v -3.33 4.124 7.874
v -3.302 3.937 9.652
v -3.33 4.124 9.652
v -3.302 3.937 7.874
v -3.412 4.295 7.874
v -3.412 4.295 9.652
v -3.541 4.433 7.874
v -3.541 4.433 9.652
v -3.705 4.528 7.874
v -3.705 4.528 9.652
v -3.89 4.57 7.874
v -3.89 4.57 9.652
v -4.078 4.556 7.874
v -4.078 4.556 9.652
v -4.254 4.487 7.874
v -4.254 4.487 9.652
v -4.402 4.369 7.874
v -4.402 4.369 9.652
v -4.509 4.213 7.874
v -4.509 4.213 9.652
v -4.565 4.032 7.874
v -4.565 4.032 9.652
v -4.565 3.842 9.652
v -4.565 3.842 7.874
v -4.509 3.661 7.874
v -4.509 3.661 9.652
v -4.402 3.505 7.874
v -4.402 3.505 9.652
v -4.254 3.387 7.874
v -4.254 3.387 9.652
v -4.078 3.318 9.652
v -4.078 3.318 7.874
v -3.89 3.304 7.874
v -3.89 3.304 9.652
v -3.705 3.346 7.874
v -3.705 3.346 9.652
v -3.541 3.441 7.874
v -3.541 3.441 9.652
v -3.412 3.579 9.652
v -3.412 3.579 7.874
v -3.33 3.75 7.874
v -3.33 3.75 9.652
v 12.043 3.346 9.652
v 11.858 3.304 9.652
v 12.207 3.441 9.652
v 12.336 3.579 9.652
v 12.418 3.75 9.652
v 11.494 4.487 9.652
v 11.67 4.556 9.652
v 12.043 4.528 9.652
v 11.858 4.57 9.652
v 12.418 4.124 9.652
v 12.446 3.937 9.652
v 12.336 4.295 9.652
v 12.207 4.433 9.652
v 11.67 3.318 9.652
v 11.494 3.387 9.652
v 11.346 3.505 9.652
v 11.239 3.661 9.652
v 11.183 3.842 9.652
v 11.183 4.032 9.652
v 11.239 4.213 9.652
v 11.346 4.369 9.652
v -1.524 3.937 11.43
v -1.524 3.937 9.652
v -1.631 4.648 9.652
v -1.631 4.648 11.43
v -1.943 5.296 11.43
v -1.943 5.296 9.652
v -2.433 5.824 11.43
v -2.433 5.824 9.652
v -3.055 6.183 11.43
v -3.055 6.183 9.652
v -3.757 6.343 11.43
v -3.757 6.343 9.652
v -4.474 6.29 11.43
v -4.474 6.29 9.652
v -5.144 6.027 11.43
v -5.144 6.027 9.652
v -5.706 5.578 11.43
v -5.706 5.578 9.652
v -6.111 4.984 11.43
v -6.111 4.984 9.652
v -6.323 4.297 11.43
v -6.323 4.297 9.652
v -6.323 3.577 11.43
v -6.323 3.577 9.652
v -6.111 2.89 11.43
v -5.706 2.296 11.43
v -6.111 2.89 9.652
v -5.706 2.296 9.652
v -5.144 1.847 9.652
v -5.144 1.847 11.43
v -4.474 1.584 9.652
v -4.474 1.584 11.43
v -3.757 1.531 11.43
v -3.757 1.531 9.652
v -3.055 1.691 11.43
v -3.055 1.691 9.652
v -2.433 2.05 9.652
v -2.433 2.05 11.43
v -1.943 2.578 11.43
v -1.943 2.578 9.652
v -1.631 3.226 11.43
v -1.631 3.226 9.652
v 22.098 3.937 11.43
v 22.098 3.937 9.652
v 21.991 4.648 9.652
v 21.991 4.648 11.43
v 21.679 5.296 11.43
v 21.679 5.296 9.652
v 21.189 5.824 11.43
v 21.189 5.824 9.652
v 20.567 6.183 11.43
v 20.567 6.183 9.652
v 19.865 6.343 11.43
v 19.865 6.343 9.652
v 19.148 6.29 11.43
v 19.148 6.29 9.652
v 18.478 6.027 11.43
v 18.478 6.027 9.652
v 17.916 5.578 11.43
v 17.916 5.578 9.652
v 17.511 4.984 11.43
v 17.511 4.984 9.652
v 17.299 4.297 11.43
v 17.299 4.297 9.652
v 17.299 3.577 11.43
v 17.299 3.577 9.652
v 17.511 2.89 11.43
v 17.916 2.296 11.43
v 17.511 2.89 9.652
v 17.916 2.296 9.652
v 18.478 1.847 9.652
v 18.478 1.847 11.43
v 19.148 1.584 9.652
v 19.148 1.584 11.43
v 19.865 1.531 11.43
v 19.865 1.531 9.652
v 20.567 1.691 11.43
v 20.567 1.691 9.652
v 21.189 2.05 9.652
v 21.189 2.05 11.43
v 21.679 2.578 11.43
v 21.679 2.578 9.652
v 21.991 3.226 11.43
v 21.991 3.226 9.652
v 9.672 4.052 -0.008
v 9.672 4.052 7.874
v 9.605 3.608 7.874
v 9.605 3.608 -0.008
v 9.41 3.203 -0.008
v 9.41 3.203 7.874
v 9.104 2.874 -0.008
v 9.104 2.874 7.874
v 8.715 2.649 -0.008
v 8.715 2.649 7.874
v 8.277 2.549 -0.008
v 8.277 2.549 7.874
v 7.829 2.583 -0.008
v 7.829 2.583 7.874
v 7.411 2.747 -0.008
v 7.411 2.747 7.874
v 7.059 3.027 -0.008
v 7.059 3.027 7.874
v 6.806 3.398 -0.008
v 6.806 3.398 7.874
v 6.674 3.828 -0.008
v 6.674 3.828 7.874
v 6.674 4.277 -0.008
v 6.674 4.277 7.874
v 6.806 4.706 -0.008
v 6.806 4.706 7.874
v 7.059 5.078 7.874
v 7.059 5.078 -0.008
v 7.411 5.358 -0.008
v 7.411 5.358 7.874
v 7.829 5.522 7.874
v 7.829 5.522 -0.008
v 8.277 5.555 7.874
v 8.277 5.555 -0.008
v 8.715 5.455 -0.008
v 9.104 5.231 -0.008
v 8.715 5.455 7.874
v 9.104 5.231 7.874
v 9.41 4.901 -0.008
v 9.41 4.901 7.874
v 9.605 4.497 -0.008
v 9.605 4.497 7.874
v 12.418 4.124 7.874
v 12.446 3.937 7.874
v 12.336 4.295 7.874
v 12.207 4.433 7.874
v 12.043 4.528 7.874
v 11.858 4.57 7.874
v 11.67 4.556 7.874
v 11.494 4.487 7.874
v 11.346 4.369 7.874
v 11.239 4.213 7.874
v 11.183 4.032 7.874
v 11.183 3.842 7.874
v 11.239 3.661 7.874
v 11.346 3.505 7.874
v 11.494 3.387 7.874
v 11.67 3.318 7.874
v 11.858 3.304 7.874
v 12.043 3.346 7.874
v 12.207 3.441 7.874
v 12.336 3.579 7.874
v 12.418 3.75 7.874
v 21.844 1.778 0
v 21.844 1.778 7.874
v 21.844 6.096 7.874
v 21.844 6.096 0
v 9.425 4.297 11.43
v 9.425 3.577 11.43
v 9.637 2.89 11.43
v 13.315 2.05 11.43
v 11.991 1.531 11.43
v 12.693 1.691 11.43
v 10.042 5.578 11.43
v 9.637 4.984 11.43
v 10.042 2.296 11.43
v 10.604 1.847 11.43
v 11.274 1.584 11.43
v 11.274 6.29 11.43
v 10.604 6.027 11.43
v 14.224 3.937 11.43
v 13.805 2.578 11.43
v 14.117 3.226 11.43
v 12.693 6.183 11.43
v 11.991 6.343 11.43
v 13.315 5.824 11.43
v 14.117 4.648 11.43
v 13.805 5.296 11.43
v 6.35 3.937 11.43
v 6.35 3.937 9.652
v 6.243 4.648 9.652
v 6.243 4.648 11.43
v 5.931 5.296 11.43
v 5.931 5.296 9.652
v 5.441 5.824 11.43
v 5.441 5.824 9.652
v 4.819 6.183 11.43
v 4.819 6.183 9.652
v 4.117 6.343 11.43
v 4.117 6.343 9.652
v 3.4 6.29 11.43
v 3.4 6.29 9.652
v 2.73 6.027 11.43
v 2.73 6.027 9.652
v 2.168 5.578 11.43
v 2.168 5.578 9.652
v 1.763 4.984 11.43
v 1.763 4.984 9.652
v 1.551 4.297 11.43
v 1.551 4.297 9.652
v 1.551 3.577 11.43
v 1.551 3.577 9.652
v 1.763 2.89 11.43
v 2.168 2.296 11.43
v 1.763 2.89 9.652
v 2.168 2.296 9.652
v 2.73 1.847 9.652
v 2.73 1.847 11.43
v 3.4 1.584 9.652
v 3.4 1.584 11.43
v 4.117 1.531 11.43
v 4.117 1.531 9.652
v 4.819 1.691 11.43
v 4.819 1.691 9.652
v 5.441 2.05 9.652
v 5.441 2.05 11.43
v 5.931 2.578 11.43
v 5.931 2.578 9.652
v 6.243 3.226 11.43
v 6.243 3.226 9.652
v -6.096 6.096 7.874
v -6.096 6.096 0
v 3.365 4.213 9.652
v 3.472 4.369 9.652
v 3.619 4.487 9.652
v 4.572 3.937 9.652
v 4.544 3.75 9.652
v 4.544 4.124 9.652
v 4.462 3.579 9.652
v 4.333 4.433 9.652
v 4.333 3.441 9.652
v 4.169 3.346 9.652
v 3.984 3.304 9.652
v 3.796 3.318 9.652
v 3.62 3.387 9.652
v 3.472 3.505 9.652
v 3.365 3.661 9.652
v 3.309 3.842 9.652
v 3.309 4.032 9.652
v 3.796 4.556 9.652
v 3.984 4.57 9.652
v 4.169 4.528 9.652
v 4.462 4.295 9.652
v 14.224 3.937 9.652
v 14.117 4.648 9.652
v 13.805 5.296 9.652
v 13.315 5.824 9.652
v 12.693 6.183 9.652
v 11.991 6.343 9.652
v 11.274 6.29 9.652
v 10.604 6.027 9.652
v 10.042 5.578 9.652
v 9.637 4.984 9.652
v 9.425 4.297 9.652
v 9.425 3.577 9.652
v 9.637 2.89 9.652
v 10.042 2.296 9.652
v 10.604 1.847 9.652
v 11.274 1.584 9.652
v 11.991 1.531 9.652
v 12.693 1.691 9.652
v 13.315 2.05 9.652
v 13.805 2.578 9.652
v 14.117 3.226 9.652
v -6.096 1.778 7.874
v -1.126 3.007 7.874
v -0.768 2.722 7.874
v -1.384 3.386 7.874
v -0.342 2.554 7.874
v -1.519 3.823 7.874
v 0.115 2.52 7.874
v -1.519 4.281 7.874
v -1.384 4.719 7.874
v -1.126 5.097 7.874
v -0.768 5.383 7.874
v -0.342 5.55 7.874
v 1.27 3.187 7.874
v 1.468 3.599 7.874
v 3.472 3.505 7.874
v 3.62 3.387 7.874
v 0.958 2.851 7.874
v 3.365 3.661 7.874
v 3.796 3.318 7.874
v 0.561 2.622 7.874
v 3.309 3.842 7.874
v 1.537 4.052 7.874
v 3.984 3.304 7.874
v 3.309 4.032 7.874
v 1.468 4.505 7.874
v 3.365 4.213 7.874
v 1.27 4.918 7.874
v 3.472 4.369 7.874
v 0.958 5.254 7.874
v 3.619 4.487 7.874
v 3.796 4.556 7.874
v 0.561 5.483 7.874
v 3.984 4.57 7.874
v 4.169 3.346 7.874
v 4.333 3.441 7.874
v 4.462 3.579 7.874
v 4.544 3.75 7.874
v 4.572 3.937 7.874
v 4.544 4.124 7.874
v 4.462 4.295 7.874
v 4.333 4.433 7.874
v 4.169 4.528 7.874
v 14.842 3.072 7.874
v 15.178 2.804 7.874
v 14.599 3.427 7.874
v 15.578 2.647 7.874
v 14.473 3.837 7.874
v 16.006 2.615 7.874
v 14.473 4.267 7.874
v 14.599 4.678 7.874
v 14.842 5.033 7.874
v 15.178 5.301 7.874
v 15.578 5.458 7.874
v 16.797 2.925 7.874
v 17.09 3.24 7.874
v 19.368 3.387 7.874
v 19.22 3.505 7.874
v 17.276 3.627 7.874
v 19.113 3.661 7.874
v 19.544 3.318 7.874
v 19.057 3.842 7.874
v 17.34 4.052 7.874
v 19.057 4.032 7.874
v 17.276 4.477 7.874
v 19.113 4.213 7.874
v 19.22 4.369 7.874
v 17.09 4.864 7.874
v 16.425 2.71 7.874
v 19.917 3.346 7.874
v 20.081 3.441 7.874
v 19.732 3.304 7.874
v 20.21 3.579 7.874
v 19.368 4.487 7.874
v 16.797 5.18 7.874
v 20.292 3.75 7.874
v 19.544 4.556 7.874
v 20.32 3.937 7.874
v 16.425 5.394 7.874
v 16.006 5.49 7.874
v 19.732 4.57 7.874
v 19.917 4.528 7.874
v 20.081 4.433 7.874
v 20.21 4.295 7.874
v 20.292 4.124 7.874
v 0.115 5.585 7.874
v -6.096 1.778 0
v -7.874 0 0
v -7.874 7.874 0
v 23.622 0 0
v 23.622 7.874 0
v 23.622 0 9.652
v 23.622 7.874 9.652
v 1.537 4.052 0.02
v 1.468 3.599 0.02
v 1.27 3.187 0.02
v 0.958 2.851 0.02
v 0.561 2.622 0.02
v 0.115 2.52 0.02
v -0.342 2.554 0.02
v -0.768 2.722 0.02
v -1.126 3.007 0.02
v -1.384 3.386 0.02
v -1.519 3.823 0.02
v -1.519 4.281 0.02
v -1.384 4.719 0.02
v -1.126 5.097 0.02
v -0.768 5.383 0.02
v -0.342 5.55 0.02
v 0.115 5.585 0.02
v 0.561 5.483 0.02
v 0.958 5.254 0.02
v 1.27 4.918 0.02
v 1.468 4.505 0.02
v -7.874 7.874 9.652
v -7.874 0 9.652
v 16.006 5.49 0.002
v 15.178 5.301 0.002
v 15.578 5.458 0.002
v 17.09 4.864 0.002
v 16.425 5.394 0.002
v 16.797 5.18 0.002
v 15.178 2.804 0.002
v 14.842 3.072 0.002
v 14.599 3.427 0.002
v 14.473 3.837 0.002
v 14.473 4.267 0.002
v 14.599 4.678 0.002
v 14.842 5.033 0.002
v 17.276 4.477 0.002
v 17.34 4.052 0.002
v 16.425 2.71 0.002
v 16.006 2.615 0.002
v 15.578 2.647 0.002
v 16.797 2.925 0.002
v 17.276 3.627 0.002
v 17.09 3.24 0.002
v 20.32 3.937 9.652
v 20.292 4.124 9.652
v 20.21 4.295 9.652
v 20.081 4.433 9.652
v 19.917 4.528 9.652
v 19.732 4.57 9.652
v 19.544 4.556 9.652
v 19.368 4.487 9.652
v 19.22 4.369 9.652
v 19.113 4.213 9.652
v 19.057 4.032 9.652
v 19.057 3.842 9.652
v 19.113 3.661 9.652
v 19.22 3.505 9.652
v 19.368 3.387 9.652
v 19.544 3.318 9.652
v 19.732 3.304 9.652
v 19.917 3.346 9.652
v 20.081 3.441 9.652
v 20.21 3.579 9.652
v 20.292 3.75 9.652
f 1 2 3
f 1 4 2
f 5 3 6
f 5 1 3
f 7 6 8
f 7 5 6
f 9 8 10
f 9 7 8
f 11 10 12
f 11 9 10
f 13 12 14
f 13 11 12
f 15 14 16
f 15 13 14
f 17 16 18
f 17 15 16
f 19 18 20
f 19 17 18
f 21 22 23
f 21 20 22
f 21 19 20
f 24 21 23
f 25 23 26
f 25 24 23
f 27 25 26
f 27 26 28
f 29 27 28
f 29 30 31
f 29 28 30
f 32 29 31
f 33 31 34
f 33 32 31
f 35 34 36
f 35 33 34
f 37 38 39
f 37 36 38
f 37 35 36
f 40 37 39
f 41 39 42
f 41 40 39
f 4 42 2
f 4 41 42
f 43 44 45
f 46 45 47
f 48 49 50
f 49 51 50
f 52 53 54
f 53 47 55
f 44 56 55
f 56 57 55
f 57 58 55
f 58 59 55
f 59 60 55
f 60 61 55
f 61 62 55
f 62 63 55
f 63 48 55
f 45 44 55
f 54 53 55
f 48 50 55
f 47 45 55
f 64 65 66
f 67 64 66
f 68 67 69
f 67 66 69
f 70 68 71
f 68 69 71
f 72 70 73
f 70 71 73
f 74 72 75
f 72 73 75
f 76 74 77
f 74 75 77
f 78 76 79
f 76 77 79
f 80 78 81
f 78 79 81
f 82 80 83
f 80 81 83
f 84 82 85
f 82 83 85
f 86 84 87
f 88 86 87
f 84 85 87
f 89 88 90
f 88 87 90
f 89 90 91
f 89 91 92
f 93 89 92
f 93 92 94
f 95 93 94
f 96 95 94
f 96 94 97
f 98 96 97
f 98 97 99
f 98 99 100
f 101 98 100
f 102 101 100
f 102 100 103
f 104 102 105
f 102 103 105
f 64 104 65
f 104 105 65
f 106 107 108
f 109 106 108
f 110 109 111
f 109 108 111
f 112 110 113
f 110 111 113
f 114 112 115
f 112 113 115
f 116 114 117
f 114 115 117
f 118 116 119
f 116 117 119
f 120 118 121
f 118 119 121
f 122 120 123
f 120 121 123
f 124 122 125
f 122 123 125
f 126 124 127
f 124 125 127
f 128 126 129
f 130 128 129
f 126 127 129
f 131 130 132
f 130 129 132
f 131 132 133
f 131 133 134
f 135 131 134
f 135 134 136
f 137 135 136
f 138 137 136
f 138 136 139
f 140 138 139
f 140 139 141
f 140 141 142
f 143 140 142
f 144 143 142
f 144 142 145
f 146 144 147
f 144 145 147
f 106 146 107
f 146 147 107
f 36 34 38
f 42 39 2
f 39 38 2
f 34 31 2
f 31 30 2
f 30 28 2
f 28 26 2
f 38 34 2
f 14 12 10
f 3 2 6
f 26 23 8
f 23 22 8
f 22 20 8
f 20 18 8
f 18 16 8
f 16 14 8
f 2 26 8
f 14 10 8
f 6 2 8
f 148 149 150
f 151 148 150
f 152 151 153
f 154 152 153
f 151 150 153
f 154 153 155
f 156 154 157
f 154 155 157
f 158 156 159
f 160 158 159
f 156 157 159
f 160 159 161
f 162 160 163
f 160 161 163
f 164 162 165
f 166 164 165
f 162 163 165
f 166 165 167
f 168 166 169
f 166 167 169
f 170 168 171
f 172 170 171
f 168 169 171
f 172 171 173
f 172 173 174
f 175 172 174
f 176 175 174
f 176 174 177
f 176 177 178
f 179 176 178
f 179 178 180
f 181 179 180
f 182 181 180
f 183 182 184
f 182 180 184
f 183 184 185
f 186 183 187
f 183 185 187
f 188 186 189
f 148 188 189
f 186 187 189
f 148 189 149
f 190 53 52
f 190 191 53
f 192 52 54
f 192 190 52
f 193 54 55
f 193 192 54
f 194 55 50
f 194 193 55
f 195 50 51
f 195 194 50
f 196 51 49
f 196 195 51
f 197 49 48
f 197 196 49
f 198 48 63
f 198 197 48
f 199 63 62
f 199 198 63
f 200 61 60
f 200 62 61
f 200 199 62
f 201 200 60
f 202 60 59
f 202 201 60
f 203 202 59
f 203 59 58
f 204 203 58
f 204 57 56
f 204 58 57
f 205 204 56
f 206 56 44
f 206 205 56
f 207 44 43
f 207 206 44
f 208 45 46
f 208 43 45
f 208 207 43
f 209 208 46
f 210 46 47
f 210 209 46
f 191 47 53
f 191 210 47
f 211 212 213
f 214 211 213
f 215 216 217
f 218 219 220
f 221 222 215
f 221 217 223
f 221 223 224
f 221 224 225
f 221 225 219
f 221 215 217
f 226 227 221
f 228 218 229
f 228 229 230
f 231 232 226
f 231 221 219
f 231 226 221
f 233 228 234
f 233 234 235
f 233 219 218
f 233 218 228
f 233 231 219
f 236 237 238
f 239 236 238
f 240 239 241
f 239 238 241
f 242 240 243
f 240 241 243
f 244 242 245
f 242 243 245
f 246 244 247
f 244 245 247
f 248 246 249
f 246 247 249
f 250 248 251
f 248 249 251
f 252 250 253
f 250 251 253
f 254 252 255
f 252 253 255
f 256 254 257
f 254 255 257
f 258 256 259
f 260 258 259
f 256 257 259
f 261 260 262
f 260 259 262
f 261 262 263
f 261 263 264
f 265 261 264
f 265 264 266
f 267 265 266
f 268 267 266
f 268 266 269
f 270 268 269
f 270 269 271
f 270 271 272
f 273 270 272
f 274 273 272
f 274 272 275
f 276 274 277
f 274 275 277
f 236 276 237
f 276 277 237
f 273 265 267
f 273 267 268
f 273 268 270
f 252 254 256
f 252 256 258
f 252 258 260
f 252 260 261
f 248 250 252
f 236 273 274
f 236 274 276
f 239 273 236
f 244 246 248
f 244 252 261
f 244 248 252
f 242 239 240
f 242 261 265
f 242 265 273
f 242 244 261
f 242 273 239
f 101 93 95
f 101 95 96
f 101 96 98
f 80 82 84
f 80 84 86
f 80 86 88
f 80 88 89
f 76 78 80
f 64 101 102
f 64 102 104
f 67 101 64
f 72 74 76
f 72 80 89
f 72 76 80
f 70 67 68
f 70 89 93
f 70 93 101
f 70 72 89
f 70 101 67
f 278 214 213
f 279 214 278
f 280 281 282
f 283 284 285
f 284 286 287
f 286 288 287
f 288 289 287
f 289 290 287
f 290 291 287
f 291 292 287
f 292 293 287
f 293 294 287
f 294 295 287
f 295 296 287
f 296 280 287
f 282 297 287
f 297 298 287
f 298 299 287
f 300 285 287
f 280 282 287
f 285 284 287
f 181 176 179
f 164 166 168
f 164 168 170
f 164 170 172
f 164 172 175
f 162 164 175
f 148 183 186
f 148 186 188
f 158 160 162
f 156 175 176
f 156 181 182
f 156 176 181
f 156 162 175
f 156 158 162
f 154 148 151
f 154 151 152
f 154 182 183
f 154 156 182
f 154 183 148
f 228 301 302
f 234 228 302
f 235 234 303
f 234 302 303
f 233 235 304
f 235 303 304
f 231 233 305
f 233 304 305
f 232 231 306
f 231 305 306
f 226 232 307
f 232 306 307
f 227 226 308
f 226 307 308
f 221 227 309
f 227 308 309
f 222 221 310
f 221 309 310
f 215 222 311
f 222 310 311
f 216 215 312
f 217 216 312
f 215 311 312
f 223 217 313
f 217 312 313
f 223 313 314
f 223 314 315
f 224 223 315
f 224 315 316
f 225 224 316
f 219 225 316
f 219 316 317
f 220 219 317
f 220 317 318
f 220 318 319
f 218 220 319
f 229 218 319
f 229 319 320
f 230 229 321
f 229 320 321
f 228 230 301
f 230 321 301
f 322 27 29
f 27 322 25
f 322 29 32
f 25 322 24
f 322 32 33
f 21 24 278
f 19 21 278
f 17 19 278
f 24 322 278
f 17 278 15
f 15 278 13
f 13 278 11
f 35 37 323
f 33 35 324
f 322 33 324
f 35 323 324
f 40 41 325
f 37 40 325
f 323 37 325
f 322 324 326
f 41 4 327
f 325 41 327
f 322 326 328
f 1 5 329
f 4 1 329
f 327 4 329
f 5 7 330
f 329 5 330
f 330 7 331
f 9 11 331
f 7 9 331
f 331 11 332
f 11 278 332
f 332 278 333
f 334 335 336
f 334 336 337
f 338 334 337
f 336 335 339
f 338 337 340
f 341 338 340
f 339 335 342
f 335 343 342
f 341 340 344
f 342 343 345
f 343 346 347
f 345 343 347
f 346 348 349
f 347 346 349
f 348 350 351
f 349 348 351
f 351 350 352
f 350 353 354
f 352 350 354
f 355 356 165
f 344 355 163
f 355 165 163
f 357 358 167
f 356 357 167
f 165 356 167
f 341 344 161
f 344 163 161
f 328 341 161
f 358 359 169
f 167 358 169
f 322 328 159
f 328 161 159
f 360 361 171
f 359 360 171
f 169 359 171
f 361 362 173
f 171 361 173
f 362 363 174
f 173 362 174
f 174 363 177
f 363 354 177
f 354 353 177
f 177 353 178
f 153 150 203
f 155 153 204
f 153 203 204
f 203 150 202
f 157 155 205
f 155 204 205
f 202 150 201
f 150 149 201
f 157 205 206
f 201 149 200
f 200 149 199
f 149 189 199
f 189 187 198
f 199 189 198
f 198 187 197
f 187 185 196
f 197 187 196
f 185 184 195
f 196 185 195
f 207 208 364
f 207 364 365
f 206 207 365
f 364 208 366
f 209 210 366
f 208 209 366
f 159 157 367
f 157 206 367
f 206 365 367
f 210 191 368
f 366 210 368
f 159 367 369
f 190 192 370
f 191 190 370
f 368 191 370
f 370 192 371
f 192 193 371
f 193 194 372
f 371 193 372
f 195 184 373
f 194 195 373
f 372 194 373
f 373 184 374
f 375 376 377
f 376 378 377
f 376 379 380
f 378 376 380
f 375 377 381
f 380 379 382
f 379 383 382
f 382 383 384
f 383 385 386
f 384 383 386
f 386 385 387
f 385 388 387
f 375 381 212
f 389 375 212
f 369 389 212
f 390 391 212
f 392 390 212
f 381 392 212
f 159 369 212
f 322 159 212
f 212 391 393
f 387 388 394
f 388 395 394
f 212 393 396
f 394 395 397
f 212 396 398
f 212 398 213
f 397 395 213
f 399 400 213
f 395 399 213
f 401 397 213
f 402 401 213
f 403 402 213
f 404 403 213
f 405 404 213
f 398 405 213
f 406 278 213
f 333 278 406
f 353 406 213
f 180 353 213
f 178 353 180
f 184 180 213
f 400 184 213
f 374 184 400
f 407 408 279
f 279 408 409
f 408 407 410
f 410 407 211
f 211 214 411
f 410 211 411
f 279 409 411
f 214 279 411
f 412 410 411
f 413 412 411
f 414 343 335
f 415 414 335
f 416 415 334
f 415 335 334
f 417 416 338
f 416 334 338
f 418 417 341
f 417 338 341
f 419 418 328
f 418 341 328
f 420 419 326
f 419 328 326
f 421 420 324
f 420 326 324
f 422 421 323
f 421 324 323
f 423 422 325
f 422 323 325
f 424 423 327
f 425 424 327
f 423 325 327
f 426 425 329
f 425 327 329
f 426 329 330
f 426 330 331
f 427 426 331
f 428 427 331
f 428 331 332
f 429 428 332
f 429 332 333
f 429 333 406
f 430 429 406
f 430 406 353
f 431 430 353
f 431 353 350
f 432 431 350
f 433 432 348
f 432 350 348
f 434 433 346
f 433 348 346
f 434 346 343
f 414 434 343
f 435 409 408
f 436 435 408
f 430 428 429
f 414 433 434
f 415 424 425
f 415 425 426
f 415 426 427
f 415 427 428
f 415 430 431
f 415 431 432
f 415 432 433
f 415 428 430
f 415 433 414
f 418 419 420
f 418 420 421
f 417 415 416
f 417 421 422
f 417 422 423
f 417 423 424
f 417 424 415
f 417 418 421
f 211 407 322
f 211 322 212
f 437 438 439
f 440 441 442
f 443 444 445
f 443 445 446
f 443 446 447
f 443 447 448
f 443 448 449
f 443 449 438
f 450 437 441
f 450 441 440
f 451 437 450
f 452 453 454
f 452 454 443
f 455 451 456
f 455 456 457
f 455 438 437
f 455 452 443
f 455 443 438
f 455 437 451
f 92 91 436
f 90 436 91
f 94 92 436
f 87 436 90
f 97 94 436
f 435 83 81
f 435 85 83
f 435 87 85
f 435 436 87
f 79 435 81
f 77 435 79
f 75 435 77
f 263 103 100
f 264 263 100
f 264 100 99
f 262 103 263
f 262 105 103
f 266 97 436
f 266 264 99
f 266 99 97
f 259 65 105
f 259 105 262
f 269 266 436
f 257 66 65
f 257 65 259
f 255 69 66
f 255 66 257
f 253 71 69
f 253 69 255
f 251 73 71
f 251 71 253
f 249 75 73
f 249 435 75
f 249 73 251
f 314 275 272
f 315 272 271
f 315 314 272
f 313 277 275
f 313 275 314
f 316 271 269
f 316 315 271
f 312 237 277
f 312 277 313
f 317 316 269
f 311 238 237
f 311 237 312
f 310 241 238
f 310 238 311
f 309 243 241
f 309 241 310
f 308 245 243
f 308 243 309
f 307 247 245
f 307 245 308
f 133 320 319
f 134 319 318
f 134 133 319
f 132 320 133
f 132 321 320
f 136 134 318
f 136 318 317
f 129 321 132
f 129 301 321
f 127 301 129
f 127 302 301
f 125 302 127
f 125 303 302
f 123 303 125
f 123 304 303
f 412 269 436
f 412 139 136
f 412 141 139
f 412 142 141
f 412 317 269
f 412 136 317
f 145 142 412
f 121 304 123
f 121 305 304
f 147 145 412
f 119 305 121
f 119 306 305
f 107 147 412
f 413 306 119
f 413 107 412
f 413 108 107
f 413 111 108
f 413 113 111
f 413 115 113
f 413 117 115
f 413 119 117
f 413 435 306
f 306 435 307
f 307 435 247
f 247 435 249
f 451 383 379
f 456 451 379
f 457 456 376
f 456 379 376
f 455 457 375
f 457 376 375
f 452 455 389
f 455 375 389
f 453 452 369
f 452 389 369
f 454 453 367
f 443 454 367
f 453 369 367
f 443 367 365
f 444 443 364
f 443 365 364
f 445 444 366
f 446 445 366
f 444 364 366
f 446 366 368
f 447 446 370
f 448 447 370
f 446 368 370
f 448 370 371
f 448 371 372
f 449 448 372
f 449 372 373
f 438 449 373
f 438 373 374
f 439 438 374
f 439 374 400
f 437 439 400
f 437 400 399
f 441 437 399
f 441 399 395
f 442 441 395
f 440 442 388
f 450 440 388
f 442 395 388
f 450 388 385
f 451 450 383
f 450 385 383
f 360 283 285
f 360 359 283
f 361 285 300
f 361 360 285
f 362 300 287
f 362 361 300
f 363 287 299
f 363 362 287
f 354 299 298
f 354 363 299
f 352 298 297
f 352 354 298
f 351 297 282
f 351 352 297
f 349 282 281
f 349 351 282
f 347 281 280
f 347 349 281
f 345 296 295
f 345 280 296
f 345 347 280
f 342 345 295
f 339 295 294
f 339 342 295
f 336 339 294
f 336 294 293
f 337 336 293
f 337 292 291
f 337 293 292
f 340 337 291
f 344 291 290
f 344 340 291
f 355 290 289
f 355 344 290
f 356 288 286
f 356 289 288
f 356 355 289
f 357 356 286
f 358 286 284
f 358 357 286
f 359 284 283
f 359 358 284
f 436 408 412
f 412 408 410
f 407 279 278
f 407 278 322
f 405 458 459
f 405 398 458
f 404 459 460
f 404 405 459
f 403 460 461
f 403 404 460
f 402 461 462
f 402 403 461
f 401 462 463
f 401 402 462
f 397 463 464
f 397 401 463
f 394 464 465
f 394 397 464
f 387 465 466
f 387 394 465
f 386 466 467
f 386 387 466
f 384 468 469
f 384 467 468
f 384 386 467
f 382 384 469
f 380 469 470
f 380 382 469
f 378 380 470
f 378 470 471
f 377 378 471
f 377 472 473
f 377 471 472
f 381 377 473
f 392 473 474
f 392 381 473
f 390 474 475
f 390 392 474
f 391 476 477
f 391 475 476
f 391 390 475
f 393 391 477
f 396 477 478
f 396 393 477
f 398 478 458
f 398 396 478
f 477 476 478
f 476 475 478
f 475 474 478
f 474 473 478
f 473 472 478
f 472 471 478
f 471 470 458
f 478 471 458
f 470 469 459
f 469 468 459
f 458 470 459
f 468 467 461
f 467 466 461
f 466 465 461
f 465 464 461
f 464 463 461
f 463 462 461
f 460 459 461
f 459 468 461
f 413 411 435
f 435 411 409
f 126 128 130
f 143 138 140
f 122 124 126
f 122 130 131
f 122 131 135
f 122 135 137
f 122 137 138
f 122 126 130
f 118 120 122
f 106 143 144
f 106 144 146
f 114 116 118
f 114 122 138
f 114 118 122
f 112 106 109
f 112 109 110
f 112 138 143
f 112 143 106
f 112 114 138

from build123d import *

# Parameters (mm, degrees)
F1_DEPTH  = 9.652
F2_R      = 2.413
F3_DEPTH  = 1.778
F4_DEPTH  = 1.778
F5_DEPTH  = 1.778
F6_DEPTH  = 1.778
F7_T      = -1.778
F8_R      = 1.4417359586
F9_DEPTH  = 7.87157
F8_R_2    = 1.507368722
F10_DEPTH = 7.88241
F8_R_3    = 1.5366007798
F11_DEPTH = 7.85389


with BuildPart() as f1:
    # F0 (on Top) → F1 (new body)
    with BuildSketch(Plane.XY):
        Polygon((-7.874, 0), (0, 0), (23.622, 0), (23.622, 7.874), (-7.874, 7.874), align=None)
    extrude(amount=F1_DEPTH)

    # F2 (on face) → F3 (join)
    with BuildSketch(Plane.XY.offset(9.652)):
        with Locations((19.685, 3.937)):
            Circle(F2_R)
    extrude(amount=F3_DEPTH)

    # F2 (on face) → F4 (join)
    with BuildSketch(Plane.XY.offset(9.652)):
        with Locations((11.811, 3.937)):
            Circle(F2_R)
    extrude(amount=F4_DEPTH)

    # F2 (on face) → F5 (join)
    with BuildSketch(Plane.XY.offset(9.652)):
        with Locations((3.937, 3.937)):
            Circle(F2_R)
    extrude(amount=F5_DEPTH)

    # F2 (on face) → F6 (join)
    with BuildSketch(Plane.XY.offset(9.652)):
        with Locations((-3.937, 3.937)):
            Circle(F2_R)
    extrude(amount=F6_DEPTH)

    # F7
    f7_openings = [f1.faces().sort_by_distance(p)[0] for p in [
        (7.874, 3.937, 0),
    ]]
    offset(amount=F7_T, openings=f7_openings, kind=Kind.INTERSECTION)

    # F8 (on face) → F9 (join)
    with BuildSketch(Plane(origin=(0, 0, 7.874), x_dir=(1, 0, 0), z_dir=(0, 0, -1))):
        with Locations((15.8983748406, -4.0523083881)):
            Circle(F8_R)
    extrude(amount=F9_DEPTH)

    # F8 (on face) → F10 (join)
    with BuildSketch(Plane(origin=(0, 0, 7.874), x_dir=(1, 0, 0), z_dir=(0, 0, -1))):
        with Locations((8.1644477323, -4.0523083881)):
            Circle(F8_R_2)
    extrude(amount=F10_DEPTH)

    # F8 (on face) → F11 (join)
    with BuildSketch(Plane(origin=(0, 0, 7.874), x_dir=(1, 0, 0), z_dir=(0, 0, -1))):
        with Locations((0, -4.0523083881)):
            Circle(F8_R_3)
    extrude(amount=F11_DEPTH)


solid = f1.part
